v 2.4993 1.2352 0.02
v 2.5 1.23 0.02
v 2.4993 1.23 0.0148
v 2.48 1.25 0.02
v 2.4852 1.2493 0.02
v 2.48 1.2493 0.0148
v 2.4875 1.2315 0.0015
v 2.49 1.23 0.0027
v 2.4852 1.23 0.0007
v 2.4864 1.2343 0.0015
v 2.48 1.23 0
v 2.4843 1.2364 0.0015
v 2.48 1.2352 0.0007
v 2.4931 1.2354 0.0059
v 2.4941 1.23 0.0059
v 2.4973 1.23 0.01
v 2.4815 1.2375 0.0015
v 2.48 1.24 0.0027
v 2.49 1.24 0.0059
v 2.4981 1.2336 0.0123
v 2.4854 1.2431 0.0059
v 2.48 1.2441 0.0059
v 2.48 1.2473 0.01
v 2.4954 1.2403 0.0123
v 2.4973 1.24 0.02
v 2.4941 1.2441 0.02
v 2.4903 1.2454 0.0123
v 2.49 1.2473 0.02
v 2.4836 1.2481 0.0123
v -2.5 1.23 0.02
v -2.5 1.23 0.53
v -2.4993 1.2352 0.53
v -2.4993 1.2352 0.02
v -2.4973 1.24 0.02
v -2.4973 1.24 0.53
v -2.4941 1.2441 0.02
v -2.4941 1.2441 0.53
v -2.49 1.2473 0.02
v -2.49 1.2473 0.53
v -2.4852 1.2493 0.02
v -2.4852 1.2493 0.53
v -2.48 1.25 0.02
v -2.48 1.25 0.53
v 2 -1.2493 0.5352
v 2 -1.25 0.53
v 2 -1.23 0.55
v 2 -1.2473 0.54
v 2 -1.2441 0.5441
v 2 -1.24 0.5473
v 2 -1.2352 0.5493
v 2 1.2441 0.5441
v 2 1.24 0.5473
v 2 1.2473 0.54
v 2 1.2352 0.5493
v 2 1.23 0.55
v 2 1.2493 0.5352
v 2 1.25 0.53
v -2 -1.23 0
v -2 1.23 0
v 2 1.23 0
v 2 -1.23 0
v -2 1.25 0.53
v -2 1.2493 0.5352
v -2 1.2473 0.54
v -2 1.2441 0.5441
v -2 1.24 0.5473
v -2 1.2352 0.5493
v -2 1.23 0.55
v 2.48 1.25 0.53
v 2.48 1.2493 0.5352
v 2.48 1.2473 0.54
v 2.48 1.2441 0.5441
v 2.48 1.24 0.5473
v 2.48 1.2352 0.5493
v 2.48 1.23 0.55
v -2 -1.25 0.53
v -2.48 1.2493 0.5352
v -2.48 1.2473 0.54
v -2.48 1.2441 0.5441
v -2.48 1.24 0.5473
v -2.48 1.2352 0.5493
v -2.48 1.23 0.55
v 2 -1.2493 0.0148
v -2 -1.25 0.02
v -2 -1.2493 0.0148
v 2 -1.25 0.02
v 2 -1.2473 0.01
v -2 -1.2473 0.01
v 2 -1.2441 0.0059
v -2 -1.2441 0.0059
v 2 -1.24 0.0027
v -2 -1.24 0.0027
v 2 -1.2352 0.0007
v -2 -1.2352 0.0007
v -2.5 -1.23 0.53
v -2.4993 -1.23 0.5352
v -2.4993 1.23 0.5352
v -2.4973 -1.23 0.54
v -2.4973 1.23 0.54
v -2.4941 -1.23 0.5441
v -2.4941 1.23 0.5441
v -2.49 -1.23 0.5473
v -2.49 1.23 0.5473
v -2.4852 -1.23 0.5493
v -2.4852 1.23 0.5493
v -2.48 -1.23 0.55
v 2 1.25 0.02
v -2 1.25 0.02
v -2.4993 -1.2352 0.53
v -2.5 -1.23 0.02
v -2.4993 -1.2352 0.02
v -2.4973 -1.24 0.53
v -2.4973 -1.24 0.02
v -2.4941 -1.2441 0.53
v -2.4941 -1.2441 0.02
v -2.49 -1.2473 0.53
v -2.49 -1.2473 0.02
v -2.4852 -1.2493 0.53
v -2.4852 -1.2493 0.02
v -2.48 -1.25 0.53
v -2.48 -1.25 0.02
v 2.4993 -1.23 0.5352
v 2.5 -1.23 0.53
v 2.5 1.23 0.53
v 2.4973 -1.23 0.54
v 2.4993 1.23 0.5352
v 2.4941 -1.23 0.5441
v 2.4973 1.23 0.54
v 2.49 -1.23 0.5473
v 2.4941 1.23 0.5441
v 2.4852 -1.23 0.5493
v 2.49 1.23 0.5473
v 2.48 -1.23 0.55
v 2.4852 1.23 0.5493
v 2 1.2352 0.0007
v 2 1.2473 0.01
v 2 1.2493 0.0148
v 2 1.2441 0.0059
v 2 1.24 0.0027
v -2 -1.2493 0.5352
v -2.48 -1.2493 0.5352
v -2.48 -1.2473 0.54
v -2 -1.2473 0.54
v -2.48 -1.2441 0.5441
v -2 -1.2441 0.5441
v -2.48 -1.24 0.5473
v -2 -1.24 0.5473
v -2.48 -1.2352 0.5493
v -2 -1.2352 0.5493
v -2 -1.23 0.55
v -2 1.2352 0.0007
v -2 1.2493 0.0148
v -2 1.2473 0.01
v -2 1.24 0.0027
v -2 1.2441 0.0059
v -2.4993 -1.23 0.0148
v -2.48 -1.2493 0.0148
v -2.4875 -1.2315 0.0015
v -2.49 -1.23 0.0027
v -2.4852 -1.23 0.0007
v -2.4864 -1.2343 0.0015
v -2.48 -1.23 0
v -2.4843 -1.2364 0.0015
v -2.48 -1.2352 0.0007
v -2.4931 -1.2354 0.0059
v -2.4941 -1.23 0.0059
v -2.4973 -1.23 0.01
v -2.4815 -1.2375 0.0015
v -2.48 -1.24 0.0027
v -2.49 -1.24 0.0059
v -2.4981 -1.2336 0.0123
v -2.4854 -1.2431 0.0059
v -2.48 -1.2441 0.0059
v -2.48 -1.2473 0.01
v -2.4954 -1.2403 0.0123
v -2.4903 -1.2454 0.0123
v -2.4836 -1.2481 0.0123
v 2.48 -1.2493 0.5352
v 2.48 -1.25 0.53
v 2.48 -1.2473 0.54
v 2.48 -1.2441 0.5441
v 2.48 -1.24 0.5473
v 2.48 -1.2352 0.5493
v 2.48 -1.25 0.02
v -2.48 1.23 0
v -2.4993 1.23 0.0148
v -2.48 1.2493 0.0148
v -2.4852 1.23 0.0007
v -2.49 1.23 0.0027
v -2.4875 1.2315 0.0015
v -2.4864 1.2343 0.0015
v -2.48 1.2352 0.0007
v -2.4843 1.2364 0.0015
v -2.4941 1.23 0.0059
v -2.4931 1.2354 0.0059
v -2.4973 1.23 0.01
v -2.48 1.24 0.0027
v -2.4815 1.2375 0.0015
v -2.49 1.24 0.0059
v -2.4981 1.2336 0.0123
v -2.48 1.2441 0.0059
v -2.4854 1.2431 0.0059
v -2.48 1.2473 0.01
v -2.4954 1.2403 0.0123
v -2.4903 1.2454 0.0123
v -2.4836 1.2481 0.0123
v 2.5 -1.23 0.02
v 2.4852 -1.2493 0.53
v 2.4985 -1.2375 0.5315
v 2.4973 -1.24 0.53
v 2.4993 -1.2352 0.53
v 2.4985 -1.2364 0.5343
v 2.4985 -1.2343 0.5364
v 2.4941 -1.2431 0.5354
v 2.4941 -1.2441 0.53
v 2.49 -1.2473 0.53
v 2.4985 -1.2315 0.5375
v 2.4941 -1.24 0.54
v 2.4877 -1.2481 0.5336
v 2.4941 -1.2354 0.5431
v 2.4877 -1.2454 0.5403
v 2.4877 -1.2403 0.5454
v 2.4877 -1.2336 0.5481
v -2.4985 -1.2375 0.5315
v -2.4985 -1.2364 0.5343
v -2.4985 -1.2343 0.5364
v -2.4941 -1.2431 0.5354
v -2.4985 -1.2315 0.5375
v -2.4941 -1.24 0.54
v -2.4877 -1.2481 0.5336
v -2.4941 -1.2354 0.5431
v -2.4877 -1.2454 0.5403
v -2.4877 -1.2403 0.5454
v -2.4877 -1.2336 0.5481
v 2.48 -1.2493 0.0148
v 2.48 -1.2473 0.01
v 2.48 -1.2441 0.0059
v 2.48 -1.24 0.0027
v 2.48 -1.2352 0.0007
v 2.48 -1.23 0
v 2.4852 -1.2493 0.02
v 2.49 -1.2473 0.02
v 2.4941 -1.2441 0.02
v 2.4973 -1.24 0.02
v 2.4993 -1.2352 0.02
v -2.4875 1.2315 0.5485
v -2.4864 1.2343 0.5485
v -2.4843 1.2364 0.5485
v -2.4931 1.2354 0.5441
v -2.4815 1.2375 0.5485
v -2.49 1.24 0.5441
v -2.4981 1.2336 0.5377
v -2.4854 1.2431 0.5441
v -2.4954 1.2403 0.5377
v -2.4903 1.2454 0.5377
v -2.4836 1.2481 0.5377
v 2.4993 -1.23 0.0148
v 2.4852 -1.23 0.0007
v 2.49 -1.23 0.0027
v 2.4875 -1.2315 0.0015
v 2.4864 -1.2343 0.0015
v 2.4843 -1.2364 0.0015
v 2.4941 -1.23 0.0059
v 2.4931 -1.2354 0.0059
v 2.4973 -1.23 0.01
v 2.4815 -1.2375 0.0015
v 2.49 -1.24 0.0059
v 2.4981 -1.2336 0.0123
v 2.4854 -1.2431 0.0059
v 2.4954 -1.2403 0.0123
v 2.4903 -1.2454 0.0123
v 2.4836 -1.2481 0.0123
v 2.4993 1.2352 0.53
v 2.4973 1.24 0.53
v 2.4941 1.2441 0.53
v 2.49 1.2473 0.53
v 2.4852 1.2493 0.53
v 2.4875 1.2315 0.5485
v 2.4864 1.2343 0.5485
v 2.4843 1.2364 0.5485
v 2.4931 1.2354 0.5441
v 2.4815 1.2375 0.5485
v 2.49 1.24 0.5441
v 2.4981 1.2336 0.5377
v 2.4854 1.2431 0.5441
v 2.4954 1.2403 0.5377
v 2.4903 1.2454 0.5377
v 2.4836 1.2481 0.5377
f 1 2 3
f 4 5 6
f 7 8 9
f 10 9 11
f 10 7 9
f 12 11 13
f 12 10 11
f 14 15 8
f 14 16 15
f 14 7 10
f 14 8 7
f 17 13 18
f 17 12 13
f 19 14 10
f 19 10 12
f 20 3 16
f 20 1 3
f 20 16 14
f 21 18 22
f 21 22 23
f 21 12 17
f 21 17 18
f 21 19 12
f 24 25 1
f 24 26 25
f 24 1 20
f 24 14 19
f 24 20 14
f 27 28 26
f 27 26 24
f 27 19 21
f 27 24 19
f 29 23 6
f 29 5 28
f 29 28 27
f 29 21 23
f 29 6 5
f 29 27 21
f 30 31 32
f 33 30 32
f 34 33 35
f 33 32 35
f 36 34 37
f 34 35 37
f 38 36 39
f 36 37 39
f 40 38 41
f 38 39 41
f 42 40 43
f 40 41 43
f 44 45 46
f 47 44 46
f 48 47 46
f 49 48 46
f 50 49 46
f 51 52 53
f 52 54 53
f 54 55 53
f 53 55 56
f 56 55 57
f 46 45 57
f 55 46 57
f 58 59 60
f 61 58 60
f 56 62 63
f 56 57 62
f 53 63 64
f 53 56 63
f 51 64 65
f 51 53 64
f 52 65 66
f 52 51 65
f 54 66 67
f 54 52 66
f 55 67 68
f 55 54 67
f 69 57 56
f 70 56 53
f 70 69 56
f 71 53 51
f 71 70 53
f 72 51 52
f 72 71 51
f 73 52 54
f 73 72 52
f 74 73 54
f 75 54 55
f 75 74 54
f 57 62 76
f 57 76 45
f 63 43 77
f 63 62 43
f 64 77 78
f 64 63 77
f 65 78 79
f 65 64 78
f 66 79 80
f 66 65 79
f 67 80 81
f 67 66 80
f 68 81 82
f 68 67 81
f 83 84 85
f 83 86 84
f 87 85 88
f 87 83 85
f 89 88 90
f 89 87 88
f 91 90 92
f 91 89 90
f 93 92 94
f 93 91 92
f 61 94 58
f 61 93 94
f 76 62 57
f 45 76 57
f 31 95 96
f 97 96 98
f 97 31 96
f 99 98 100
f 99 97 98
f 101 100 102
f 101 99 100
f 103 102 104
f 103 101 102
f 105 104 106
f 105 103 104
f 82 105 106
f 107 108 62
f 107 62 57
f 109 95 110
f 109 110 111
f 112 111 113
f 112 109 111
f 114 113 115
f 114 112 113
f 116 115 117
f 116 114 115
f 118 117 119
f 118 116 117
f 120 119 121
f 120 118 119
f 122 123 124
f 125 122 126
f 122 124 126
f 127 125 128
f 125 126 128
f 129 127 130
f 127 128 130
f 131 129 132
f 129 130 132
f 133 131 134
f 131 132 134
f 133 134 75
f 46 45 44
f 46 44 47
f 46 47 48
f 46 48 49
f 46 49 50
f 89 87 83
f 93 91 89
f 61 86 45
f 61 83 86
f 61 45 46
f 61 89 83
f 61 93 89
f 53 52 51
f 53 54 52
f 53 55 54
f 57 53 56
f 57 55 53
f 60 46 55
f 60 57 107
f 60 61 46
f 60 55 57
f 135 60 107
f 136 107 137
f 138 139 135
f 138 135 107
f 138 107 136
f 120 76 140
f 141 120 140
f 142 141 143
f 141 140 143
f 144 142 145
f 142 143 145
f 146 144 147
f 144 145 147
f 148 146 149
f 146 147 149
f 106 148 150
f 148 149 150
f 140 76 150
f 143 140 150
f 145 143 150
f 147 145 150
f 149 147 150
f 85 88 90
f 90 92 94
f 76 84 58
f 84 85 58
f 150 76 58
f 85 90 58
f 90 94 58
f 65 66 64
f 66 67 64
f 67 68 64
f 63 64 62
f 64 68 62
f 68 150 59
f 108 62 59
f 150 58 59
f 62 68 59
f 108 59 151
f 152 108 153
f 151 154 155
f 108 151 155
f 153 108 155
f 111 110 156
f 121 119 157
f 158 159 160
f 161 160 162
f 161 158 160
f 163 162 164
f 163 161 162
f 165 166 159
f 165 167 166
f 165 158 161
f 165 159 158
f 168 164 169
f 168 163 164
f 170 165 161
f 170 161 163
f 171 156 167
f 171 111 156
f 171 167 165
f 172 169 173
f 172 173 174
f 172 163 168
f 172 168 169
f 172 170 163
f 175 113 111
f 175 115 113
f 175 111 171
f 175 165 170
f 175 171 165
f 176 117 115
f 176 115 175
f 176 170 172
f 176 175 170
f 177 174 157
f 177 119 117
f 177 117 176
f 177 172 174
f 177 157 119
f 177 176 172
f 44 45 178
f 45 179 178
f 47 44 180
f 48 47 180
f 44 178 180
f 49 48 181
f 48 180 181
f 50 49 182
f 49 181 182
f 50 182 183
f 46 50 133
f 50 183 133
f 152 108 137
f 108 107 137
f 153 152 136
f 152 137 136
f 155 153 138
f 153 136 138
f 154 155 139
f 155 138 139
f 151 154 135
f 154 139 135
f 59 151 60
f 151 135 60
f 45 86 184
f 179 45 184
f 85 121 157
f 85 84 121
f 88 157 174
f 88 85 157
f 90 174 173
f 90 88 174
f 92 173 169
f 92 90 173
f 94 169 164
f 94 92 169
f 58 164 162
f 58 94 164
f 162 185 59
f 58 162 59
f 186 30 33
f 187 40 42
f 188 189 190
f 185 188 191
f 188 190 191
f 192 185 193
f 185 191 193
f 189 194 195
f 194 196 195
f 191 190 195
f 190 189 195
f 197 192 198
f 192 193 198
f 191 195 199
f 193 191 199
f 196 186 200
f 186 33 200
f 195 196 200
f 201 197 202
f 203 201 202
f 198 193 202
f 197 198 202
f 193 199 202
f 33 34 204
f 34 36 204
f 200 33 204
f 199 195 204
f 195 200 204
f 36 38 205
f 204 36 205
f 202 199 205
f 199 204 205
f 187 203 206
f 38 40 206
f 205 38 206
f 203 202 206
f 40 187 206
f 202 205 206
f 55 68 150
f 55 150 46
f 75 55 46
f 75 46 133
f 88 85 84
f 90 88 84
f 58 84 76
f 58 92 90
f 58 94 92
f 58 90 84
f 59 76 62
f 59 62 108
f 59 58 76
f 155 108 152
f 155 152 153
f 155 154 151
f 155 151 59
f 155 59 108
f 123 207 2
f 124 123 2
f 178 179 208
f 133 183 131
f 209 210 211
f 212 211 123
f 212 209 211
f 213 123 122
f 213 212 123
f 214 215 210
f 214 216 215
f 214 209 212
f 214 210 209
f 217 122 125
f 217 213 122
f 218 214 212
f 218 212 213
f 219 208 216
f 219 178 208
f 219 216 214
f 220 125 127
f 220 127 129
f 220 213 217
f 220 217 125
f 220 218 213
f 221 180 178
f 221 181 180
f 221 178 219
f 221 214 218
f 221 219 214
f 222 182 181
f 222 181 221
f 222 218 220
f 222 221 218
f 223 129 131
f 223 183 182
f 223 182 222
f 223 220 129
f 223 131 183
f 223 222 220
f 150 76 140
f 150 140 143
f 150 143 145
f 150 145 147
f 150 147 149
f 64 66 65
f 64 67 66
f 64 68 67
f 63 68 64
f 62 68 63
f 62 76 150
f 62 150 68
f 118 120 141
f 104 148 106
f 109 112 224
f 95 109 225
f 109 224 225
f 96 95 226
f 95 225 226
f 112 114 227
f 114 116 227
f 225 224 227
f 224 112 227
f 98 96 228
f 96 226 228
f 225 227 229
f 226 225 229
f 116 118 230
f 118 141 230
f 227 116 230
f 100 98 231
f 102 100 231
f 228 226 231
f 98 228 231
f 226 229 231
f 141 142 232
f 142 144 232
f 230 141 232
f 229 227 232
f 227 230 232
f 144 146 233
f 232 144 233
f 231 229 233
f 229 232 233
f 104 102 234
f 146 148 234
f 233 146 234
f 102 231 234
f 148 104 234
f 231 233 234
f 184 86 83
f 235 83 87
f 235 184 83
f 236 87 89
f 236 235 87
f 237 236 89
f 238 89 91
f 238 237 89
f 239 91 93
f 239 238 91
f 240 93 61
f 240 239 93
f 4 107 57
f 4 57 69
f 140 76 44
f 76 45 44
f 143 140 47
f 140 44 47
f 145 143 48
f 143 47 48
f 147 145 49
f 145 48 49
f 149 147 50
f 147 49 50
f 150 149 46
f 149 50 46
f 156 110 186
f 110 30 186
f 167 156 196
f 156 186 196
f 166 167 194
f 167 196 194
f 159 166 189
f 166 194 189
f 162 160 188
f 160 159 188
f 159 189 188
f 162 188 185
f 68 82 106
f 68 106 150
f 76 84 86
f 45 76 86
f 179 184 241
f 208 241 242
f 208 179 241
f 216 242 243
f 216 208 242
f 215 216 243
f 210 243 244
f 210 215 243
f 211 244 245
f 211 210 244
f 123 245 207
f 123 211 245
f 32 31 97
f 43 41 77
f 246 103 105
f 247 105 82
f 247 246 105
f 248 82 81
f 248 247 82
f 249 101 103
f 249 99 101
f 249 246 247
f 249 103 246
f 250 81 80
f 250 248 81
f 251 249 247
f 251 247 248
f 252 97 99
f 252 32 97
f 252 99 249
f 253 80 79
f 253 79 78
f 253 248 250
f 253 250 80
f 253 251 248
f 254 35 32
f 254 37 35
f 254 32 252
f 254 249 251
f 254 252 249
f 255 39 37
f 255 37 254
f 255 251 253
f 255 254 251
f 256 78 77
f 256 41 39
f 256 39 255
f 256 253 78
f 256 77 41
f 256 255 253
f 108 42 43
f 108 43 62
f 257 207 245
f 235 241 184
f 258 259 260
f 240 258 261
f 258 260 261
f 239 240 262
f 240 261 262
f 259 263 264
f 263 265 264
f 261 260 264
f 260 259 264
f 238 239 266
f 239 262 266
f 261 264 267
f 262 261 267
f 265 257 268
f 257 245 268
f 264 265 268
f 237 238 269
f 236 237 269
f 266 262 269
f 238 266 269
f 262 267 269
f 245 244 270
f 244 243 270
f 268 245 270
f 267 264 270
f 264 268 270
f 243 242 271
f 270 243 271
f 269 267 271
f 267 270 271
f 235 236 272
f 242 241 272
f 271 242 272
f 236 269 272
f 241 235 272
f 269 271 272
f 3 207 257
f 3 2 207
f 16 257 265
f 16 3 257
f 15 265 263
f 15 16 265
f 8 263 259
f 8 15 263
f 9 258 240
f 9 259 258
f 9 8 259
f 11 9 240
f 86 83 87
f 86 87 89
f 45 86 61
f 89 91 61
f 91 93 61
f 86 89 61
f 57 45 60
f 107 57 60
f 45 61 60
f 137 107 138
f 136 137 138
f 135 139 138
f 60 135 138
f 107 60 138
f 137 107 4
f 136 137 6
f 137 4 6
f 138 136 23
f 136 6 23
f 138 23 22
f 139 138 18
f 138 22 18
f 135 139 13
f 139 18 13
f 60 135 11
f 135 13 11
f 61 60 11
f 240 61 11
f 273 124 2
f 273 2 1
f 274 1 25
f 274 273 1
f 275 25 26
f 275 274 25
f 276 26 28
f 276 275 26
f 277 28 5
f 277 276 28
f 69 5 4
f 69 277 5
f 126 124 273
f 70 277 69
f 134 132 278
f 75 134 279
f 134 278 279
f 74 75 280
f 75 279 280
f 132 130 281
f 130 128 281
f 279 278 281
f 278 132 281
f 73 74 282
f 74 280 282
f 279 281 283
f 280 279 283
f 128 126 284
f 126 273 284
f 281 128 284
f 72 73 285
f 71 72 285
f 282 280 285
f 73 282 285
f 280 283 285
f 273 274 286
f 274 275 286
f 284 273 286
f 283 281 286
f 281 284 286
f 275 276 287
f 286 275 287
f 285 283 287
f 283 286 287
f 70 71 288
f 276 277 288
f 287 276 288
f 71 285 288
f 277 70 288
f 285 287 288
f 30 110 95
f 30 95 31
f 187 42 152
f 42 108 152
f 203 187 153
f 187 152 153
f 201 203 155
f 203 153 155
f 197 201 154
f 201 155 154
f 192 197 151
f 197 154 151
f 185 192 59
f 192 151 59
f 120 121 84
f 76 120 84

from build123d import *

# Parameters (mm, degrees)
F2_W     = 4
F2_H     = 2.5
F3_DEPTH = 0.53
F2_W_2   = 0.5
F4_DEPTH = 0.55
F5_DEPTH = 0.55
F6_DEPTH = 0.02
F7_R     = 0.01999
F7_2_R   = 0.01999
F7_3_R   = 0.01999
F7_4_R   = 0.01999


# Not quite as in the source:
# - a fillet or chamfer is up to 0.001 mm smaller than in the source, because OpenCascade refuses the exact size


with BuildPart() as f3:
    # F2 (on Top) → F3 (new body)
    with BuildSketch(Plane.XY):
        Rectangle(F2_W, F2_H)
    extrude(amount=F3_DEPTH)


with BuildPart() as f4:
    # F2 (on Top) → F4 (new body)
    with BuildSketch(Plane.XY):
        with Locations((-2.25, 0)):
            Rectangle(F2_W_2, F2_H)
    extrude(amount=F4_DEPTH)

    # F7 (radius 0.02 in the source; OpenCascade refuses exactly that, so slightly less here)
    f7_edges = [f4.edges().sort_by_distance(p)[0] for p in [
        (-2.25, -1.25, 0.55),
        (-2.5, 1.25, 0.275),
        (-2.5, -1.25, 0.275),
        (-2.5, 0, 0),
        (-2.5, 0, 0.55),
        (-2.25, 1.25, 0.55),
        (-2.25, 1.25, 0),
        (-2.25, -1.25, 0),
    ]]
    fillet(f7_edges, radius=F7_R)


with BuildPart() as f5:
    # F2 (on Top) → F5 (new body)
    with BuildSketch(Plane.XY):
        with Locations((2.25, 0)):
            Rectangle(F2_W_2, F2_H)
    extrude(amount=F5_DEPTH)

    # F7#2 (radius 0.02 in the source; OpenCascade refuses exactly that, so slightly less here)
    f7_2_edges = [f5.edges().sort_by_distance(p)[0] for p in [
        (2.25, -1.25, 0.55),
        (2.5, -1.25, 0.275),
        (2.5, 1.25, 0.275),
        (2.5, 0, 0),
        (2.5, 0, 0.55),
        (2.25, 1.25, 0.55),
        (2.25, 1.25, 0),
        (2.25, -1.25, 0),
    ]]
    fillet(f7_2_edges, radius=F7_2_R)


with BuildPart() as f6:
    # F6 (new): a face of the model
    f6_faces = [f3.part.faces().sort_by_distance(p)[0] for p in [
        (0, 0, 0.53),
    ]]
    extrude(f6_faces, amount=F6_DEPTH)

    # F7#4 (radius 0.02 in the source; OpenCascade refuses exactly that, so slightly less here)
    f7_4_edges = [f6.edges().sort_by_distance(p)[0] for p in [
        (0, -1.25, 0.55),
        (0, 1.25, 0.55),
    ]]
    fillet(f7_4_edges, radius=F7_4_R)


with BuildPart() as f3_1:
    add(f3.part)

    # F7#3 (radius 0.02 in the source; OpenCascade refuses exactly that, so slightly less here)
    f7_3_edges = [f3_1.edges().sort_by_distance(p)[0] for p in [
        (0, 1.25, 0),
        (0, -1.25, 0),
    ]]
    fillet(f7_3_edges, radius=F7_3_R)


solid = Compound([f4.part, f5.part, f6.part, f3_1.part])
